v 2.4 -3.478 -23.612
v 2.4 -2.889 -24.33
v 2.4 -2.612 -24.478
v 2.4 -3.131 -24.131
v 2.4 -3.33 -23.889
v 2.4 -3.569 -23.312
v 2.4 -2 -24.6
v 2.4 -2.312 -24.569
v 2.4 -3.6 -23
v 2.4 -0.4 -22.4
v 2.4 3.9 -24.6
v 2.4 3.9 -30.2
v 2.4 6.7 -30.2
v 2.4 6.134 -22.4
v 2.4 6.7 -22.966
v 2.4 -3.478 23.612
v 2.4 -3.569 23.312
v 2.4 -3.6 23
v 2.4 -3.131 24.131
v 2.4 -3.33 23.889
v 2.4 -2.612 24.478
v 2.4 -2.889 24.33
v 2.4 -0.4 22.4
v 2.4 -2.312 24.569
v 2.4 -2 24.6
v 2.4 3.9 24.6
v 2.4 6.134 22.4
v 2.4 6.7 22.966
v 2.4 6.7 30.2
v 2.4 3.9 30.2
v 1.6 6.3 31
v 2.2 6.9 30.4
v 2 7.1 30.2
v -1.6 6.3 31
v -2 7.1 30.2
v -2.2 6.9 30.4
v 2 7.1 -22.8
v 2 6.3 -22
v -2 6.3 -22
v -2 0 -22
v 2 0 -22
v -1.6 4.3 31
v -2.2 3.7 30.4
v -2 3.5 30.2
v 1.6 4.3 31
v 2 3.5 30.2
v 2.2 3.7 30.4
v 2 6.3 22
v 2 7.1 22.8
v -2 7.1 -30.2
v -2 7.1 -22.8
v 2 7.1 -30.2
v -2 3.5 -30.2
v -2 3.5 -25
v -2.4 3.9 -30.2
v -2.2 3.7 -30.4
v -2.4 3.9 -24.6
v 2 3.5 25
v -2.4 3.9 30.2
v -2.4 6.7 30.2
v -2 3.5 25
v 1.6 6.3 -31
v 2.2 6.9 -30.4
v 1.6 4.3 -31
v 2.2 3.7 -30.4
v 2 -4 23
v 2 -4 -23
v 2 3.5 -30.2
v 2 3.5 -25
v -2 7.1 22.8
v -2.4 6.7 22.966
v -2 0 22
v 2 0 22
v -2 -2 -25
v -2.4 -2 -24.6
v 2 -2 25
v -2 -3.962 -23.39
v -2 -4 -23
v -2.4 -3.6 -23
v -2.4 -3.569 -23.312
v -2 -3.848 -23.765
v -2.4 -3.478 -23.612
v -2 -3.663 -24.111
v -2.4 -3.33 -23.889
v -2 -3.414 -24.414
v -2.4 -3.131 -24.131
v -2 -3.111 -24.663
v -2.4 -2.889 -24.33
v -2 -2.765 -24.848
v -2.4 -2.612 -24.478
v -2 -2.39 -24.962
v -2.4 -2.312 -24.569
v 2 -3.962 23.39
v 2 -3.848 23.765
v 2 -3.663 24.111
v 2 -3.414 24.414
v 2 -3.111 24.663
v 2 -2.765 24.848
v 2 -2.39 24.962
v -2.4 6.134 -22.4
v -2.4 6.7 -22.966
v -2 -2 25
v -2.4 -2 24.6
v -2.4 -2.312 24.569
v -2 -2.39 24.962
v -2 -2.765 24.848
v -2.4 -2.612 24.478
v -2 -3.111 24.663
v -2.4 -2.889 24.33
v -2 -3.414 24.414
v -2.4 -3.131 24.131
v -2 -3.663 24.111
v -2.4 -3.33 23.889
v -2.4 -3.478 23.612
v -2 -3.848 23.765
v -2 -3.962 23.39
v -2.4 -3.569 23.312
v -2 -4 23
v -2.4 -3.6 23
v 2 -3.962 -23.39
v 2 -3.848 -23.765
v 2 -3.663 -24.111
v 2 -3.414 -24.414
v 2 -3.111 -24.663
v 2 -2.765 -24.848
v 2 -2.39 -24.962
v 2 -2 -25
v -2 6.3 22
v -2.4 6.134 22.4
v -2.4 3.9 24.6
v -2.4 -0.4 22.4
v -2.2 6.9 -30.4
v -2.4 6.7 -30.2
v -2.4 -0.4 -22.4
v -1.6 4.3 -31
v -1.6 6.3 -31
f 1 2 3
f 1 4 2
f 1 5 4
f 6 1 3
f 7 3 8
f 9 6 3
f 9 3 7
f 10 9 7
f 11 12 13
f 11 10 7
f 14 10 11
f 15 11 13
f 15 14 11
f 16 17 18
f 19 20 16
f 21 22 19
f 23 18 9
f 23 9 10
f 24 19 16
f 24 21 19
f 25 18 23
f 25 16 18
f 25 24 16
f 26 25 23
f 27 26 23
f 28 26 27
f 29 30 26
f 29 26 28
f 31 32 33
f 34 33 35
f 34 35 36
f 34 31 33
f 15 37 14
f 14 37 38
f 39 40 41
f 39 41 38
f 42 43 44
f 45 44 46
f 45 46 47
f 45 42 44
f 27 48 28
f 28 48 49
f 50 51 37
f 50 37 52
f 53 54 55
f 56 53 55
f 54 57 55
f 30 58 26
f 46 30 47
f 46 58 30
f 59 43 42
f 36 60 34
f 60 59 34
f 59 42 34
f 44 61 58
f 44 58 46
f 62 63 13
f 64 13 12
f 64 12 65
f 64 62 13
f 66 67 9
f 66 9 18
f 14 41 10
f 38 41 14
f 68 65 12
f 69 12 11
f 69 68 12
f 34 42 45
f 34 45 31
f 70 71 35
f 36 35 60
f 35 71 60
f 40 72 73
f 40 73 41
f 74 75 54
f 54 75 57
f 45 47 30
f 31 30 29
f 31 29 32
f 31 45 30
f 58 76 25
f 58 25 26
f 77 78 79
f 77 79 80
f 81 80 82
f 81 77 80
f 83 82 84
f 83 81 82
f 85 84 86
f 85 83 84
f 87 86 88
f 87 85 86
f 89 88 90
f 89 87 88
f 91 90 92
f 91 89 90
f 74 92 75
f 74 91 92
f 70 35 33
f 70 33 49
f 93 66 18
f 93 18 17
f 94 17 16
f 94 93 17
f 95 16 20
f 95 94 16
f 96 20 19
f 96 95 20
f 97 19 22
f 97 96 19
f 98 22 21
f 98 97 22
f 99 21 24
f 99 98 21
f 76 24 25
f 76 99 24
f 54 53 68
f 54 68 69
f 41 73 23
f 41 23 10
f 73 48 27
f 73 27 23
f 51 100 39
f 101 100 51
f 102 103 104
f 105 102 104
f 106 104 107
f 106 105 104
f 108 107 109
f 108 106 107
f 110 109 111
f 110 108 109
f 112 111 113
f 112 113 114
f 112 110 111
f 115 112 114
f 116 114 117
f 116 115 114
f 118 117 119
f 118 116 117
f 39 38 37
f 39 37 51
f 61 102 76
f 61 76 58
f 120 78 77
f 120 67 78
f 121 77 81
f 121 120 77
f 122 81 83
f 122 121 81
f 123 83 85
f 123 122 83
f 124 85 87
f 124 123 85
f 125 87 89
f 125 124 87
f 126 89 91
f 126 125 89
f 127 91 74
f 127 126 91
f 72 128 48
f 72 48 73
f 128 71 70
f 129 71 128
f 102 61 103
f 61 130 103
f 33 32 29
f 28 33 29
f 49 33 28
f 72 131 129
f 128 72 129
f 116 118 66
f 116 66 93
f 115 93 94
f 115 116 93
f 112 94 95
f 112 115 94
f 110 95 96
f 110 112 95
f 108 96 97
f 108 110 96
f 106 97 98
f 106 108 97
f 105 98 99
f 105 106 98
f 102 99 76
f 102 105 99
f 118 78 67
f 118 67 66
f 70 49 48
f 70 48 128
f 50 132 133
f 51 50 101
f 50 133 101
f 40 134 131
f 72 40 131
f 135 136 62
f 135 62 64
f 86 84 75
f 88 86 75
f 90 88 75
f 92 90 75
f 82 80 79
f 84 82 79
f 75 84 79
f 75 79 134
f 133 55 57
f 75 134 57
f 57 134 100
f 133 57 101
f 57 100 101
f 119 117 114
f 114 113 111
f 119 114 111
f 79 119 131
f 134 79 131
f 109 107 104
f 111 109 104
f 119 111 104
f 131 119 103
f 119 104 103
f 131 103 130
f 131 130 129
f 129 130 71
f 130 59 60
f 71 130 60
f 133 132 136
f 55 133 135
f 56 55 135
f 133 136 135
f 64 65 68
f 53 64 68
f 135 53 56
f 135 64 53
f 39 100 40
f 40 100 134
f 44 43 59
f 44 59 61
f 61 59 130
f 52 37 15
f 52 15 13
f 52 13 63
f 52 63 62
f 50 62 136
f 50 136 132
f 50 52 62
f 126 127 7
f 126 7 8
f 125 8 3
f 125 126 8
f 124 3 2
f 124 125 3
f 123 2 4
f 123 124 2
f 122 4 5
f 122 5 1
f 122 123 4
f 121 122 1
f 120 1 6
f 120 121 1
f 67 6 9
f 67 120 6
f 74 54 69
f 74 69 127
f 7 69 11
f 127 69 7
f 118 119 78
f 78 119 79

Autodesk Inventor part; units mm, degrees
ref_plane "YZ Plane" through (0, 0, 0) normal (1, 0, 0) x (0, 1, 0)
ref_plane "XZ Plane" through (0, 0, 0) normal (0, 1, 0) x (-1, 0, 0)
ref_plane "XY Plane" through (0, 0, 0) normal (0, 0, 1) x (1, 0, 0)
sketch "スケッチ1" plane through (0, 0, 0) normal (1, 0, 0) x (0, 1, 0)
  line L0 (-6.16, 0) -> (8.96, 0) projected
  line L1 (0, 43.4) -> (0, -43.4) projected
  line L2 (0, 22) -> (0, -22)
  line L3 (0, -22) -> (7.1, -22)
  line L4 (7.1, -22) -> (7.1, -31)
  line L5 (7.1, -31) -> (3.5, -31)
  line L6 (3.5, -31) -> (3.5, -25)
  line L7 (3.5, -25) -> (-4, -25)
  line L8 (-4, -25) -> (-4, 25)
  line L9 (-4, 25) -> (3.5, 25)
  line L10 (3.5, 25) -> (3.5, 31)
  line L11 (3.5, 31) -> (7.1, 31)
  line L12 (7.1, 31) -> (7.1, 22)
  line L13 (7.1, 22) -> (0, 22)
  point P0 (0, 0)
  dimension "d0" = 3.5
  dimension "d1" = 4
  dimension "d2" = 50
  dimension "d3" = 6
  dimension "d4" = 3
  dimension "d5" = 3.6
extrude "押し出し1" add sketch "スケッチ1" along normal mid plane 4.8
chamfer "面取り1" distance 0.8 angle 45 10 edges at (0, 7.1, 31) (0, 3.5, 31) (2.4, 5.3, 31) (-2.4, 5.3, 31) (2.4, 5.3, -31) (0, 7.1, -31) (-2.4, 5.3, -31) (0, 3.5, -31) (0, 7.1, 22) (0, 7.1, -22)
fillet "フィレット1" radius 2 2 edges at (0, -4, 25) (0, -4, -25)
chamfer "面取り2" distance 0.4 angle 45 28 edges at (2.4, -4, 0) (2.4, -3.4142, -24.4142) (2.4, 0.75, -25) (2.4, 3.5, -27.6) (2.4, -3.4142, 24.4142) (2.4, 0.75, 25) (2.4, 3.5, 27.6) (-2.4, 0.75, 25) (-2.4, -3.4142, 24.4142) (-2.4, 3.5, 27.6) (-2.4, -4, 0) (-2.4, -3.4142, -24.4142) (-2.4, 0.75, -25) (-2.4, 3.5, -27.6) (2.4, 0, 0) (-2.4, 0, 0) (2.4, 3.15, -22) (2.4, 6.7, -22.4) (2.4, 7.1, -26.5) (-2.4, 7.1, -26.5) (-2.4, 6.7, -22.4) (-2.4, 3.15, -22) (-2.4, 3.15, 22) (-2.4, 6.7, 22.4) (-2.4, 7.1, 26.5) (2.4, 7.1, 26.5) (2.4, 6.7, 22.4) (2.4, 3.15, 22)
properties part number "TrussCC_S1"
